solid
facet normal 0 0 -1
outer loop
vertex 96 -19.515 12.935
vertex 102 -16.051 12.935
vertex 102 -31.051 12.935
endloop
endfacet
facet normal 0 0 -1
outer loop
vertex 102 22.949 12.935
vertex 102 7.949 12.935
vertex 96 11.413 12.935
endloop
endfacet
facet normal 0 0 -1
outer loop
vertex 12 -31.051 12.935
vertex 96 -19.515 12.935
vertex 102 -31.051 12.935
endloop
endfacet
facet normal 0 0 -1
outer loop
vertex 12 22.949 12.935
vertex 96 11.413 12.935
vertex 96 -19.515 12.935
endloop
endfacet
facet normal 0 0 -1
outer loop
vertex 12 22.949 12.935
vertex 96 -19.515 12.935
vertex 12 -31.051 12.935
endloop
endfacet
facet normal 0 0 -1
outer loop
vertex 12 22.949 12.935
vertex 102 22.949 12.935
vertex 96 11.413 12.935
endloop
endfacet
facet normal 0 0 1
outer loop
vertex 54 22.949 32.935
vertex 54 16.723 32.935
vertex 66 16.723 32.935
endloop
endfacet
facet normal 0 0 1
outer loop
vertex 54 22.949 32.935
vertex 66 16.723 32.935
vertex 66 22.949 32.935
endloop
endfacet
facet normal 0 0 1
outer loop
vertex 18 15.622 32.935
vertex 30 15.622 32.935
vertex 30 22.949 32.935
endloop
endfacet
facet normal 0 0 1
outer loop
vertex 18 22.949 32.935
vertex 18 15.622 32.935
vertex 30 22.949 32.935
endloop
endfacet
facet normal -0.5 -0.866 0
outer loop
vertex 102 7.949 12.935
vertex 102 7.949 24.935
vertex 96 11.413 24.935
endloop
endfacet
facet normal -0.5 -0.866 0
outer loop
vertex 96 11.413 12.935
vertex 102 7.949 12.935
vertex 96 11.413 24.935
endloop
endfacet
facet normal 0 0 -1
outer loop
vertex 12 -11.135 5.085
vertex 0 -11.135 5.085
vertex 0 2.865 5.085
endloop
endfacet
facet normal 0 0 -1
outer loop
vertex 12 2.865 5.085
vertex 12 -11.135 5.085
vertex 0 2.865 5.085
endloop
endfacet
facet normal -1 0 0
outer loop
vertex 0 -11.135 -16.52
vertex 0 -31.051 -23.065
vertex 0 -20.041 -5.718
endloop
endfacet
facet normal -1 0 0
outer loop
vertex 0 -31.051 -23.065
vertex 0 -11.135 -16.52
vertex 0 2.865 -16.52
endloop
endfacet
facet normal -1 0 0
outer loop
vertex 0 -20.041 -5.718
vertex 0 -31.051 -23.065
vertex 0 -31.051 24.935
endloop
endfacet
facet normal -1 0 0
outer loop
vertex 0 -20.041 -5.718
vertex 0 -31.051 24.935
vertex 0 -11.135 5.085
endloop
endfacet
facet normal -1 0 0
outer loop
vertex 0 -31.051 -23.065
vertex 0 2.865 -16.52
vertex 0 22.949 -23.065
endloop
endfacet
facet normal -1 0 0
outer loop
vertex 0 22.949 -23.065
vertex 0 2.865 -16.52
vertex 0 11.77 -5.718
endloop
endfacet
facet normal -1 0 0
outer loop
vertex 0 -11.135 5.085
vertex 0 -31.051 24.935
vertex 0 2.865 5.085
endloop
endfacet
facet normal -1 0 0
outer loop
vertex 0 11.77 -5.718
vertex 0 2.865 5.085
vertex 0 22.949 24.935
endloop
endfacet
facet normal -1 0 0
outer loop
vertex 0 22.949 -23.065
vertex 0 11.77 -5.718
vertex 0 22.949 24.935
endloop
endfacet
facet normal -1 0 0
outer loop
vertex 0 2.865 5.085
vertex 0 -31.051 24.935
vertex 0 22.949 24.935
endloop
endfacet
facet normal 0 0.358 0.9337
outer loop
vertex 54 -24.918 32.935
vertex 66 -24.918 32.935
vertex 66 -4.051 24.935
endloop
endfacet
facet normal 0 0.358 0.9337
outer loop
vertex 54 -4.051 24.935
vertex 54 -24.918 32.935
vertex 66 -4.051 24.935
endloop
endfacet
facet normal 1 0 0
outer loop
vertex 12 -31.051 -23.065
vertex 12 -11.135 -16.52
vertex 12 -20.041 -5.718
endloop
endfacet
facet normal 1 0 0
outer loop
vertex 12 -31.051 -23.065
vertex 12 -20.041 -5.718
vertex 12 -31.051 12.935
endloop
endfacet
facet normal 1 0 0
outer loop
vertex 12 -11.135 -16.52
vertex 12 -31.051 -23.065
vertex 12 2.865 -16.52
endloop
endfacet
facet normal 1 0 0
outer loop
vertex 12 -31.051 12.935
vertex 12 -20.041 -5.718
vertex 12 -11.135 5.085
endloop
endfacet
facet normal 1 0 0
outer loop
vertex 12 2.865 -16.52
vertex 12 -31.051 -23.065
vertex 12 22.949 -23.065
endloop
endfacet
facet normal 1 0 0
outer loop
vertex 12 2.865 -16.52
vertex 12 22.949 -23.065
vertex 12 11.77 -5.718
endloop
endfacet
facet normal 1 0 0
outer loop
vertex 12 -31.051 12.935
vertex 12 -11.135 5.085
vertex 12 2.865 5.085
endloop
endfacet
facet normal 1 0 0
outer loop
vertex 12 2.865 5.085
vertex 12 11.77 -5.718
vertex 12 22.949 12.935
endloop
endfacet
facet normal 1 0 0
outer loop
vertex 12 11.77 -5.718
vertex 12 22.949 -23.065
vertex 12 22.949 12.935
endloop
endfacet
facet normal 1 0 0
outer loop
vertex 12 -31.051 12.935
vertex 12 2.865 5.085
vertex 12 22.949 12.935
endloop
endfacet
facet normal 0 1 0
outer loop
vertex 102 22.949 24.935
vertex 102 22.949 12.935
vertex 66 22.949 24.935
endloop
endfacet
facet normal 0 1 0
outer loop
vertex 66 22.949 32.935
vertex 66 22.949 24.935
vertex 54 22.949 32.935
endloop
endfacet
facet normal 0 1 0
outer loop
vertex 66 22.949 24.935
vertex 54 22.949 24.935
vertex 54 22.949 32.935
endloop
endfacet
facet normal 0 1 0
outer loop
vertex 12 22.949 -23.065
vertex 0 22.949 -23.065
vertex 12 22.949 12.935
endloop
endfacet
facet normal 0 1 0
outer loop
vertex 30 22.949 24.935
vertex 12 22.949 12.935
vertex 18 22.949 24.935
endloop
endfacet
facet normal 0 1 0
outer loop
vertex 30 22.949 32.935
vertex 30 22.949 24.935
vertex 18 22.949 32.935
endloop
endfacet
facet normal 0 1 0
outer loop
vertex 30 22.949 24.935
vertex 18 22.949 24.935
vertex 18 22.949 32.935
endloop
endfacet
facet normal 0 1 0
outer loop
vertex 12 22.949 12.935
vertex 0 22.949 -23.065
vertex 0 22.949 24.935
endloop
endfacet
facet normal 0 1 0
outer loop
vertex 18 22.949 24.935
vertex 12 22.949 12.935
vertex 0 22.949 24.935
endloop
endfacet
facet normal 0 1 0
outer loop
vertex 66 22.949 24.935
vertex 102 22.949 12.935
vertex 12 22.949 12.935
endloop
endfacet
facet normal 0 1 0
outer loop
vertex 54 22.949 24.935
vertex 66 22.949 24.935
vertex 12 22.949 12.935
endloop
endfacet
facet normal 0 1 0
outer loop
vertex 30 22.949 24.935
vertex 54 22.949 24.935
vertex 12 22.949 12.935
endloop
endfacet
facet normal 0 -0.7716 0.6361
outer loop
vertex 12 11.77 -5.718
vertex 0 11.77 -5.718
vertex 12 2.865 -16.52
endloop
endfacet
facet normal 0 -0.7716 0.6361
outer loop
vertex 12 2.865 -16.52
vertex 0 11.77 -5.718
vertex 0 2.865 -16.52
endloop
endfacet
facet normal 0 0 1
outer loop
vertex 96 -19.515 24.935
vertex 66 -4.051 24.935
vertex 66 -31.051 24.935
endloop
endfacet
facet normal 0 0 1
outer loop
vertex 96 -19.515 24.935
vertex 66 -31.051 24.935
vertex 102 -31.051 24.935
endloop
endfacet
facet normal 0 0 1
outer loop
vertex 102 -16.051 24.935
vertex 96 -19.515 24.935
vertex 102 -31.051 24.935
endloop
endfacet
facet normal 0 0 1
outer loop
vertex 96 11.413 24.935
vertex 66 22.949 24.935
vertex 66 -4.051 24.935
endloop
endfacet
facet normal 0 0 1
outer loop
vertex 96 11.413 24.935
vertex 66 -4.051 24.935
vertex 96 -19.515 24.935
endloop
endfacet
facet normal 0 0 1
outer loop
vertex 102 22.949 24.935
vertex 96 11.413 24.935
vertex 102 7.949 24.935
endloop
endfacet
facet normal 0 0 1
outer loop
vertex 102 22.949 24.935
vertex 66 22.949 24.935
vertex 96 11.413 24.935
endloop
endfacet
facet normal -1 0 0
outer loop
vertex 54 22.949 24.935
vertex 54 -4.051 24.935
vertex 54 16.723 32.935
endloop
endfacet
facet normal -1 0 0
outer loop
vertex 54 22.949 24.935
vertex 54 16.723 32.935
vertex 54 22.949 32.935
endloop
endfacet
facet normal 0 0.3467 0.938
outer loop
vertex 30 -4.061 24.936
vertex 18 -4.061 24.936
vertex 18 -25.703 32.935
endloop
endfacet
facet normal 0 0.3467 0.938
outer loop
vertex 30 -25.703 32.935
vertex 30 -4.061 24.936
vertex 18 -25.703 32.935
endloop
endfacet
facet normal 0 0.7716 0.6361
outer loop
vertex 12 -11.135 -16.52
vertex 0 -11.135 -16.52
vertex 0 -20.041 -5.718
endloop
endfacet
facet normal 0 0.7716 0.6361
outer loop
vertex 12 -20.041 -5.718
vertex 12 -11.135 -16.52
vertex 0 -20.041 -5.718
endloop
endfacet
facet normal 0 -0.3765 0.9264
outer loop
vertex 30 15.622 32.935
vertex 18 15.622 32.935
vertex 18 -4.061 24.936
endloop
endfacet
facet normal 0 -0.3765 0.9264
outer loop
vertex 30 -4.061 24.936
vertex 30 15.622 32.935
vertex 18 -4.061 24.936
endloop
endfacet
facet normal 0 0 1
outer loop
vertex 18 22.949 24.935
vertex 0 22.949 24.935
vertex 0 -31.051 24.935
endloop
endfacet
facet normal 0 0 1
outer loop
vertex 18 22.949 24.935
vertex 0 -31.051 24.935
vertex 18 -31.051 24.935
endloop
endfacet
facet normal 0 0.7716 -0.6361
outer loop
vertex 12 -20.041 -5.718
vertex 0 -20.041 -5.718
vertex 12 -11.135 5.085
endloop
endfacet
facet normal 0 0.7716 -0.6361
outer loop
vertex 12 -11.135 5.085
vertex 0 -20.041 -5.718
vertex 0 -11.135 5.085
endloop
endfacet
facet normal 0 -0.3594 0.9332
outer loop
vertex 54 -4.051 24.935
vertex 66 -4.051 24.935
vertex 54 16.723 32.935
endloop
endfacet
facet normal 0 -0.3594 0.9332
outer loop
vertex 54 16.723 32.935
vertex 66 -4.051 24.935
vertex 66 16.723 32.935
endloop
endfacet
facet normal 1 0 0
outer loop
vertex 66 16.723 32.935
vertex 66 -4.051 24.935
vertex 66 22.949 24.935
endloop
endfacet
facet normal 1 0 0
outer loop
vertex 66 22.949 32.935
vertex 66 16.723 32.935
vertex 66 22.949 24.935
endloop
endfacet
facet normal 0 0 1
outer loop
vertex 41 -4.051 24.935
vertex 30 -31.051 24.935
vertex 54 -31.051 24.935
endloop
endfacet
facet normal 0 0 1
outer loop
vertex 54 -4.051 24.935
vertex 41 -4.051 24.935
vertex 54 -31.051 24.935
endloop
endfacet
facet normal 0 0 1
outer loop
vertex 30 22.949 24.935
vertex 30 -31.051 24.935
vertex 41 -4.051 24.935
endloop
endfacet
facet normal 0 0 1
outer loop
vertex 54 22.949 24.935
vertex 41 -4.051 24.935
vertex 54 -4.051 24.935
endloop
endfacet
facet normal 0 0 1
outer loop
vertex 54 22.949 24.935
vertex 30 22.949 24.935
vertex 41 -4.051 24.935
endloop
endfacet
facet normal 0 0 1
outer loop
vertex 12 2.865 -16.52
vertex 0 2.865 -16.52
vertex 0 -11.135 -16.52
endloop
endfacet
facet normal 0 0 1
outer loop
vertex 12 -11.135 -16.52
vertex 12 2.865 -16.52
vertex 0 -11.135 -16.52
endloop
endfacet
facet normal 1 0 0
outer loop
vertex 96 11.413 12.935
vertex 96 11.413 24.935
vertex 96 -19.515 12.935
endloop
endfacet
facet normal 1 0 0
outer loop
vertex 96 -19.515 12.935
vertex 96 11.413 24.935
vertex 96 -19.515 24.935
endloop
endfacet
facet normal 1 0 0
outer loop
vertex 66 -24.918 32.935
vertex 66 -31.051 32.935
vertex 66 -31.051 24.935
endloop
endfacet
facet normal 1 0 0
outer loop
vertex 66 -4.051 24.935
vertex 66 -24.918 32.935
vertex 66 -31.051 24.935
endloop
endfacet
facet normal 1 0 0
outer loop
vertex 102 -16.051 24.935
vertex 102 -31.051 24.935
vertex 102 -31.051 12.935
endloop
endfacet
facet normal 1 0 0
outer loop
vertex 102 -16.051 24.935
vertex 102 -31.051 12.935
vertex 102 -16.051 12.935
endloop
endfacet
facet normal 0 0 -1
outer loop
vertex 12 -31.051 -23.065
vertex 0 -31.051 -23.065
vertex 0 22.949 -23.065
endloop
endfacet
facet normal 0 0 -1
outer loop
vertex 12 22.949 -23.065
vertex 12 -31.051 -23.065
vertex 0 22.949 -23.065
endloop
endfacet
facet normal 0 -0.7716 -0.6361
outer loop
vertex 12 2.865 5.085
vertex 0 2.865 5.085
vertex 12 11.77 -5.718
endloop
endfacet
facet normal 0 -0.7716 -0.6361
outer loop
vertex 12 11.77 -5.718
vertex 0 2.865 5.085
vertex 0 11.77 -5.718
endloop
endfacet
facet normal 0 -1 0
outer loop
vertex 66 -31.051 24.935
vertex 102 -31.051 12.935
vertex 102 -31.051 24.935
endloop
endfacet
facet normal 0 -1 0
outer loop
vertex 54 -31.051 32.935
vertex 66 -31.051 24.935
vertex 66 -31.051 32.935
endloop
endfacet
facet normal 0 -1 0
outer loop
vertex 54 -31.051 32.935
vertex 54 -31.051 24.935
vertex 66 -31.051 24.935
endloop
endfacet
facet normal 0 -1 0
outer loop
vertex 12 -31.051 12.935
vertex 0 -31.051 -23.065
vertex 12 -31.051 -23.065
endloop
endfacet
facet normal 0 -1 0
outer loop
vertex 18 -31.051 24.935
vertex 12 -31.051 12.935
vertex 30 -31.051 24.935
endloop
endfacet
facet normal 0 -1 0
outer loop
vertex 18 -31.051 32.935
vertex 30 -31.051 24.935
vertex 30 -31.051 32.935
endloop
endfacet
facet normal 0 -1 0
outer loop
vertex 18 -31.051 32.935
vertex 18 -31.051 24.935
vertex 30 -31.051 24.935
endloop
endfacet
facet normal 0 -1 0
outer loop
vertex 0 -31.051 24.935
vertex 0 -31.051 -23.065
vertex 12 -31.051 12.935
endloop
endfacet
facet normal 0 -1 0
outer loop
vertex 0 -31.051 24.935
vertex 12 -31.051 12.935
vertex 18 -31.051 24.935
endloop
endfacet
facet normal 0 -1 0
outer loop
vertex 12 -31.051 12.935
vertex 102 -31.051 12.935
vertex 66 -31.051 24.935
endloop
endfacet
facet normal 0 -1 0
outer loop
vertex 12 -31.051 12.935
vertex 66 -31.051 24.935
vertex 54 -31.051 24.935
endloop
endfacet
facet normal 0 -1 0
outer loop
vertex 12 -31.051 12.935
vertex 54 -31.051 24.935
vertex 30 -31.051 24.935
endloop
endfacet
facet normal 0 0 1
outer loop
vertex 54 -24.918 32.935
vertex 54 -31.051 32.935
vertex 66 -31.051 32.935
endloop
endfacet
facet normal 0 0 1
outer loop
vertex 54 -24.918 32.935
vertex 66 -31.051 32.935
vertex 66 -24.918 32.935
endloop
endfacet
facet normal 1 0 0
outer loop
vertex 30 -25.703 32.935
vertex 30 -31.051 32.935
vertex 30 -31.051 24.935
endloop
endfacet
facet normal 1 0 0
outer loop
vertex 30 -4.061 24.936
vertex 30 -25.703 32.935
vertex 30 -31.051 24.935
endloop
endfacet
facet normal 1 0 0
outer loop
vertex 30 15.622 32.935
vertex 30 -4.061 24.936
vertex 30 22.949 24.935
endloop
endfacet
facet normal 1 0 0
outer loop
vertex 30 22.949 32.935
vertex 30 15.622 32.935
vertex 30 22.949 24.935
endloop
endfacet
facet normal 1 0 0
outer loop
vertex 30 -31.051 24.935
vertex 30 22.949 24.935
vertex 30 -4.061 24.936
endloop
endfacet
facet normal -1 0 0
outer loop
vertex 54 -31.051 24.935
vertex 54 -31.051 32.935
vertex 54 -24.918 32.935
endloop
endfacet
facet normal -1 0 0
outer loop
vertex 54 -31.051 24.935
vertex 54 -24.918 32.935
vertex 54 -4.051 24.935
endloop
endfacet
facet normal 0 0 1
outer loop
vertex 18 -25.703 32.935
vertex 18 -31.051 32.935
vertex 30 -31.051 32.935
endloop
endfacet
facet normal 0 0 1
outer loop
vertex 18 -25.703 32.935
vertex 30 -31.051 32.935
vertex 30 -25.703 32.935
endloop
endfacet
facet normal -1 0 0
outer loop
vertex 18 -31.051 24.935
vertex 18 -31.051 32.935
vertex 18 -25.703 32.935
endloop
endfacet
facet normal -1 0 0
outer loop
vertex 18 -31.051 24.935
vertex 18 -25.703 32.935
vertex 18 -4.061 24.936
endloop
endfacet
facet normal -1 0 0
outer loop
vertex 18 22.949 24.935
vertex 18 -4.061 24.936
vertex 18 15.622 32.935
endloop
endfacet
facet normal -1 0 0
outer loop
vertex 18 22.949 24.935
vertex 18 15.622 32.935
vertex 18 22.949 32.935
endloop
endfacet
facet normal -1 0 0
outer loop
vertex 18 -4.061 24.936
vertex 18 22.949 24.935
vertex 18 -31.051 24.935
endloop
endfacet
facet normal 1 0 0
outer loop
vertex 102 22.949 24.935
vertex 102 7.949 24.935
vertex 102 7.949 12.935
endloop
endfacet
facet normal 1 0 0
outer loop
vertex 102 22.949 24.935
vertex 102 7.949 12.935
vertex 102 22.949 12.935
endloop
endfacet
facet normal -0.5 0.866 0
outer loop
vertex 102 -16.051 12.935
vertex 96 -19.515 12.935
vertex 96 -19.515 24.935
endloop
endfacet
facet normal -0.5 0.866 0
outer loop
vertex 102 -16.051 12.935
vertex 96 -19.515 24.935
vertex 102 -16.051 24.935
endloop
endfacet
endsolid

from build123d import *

# Parameters (mm, degrees)
F0_W      = 54
F0_H      = 56
F1_DEPTH  = 102
F2_W      = 90
F2_H      = 36
F3_DEPTH  = 59.1
F6_DEPTH  = 25
F7_W      = 18
F7_H      = 54
F8_DEPTH  = 8
F9_W      = 24
F9_H      = 54
F10_DEPTH = 8
F11_W     = 36
F11_H     = 54
F12_DEPTH = 8
F14_DEPTH = 12
F16_DEPTH = 25
F18_DEPTH = 42.4
F20_DEPTH = 25


with BuildPart() as f1:
    # F0 (on Right) → F1 (new body)
    with BuildSketch(Plane.YZ):
        with Locations((-4.050715, 4.935318)):
            Rectangle(F0_W, F0_H)
    extrude(amount=F1_DEPTH)

    # F2 (on face) → F3 (cut)
    with BuildSketch(Plane(origin=(0, 22.949285, 0), x_dir=(-1, 0, 0), z_dir=(0, 1, 0))):
        with Locations((-57, -5.064682)):
            Rectangle(F2_W, F2_H)
    extrude(amount=-F3_DEPTH, mode=Mode.SUBTRACT)

    # F5 (on face) → F6 (cut)
    with BuildSketch(Plane(origin=(0, 0, 0), x_dir=(0, -1, 0), z_dir=(-1, 0, 0))):
        Polygon((-2.864712, -16.520232), (11.135288, -16.520232), (20.040549, -5.717624), (11.135288, 5.084983), (-2.864712, 5.084983), (-11.769973, -5.717624), align=None)
    extrude(amount=-F6_DEPTH, mode=Mode.SUBTRACT)

    # F7 (on face) → F8 (cut)
    with BuildSketch(Plane.XY.offset(32.935318)):
        with Locations((9, -4.050715)):
            Rectangle(F7_W, F7_H)
    extrude(amount=-F8_DEPTH, mode=Mode.SUBTRACT)

    # F9 (on face) → F10 (cut)
    with BuildSketch(Plane.XY.offset(32.935318)):
        with Locations((42, -4.050715)):
            Rectangle(F9_W, F9_H)
    extrude(amount=-F10_DEPTH, mode=Mode.SUBTRACT)

    # F11 (on face) → F12 (cut)
    with BuildSketch(Plane.XY.offset(32.935318)):
        with Locations((84, -4.050715)):
            Rectangle(F11_W, F11_H)
    extrude(amount=-F12_DEPTH, mode=Mode.SUBTRACT)

    # F13 (on face) → F14 (cut)
    with BuildSketch(Plane.YZ.offset(66)):
        Polygon((16.72348, 32.935318), (-4.050715, 32.935318), (-4.050715, 24.935318), align=None)
    extrude(amount=-F14_DEPTH, mode=Mode.SUBTRACT)

    # F15 (on face) → F16 (cut)
    with BuildSketch(Plane.YZ.offset(66)):
        Polygon((-4.050715, 32.935318), (-24.917709, 32.935318), (-4.050715, 24.935318), align=None)
    extrude(amount=-F16_DEPTH, mode=Mode.SUBTRACT)

    # F17 (on face) → F18 (cut)
    with BuildSketch(Plane(origin=(0, 0, 0), x_dir=(0, -1, 0), z_dir=(-1, 0, 0))):
        Polygon((26.28649, 33.151057), (-16.84958, 33.434331), (4.061393, 24.936128), align=None)
    extrude(amount=-F18_DEPTH, mode=Mode.SUBTRACT)

    # F19 (on face) → F20 (cut)
    with BuildSketch(Plane.XY.offset(24.935318)):
        Polygon((96, -19.514816), (102, -16.050715), (102, 7.949285), (96, 11.413387), align=None)
    extrude(amount=-F20_DEPTH, mode=Mode.SUBTRACT)


solid = f1.part
